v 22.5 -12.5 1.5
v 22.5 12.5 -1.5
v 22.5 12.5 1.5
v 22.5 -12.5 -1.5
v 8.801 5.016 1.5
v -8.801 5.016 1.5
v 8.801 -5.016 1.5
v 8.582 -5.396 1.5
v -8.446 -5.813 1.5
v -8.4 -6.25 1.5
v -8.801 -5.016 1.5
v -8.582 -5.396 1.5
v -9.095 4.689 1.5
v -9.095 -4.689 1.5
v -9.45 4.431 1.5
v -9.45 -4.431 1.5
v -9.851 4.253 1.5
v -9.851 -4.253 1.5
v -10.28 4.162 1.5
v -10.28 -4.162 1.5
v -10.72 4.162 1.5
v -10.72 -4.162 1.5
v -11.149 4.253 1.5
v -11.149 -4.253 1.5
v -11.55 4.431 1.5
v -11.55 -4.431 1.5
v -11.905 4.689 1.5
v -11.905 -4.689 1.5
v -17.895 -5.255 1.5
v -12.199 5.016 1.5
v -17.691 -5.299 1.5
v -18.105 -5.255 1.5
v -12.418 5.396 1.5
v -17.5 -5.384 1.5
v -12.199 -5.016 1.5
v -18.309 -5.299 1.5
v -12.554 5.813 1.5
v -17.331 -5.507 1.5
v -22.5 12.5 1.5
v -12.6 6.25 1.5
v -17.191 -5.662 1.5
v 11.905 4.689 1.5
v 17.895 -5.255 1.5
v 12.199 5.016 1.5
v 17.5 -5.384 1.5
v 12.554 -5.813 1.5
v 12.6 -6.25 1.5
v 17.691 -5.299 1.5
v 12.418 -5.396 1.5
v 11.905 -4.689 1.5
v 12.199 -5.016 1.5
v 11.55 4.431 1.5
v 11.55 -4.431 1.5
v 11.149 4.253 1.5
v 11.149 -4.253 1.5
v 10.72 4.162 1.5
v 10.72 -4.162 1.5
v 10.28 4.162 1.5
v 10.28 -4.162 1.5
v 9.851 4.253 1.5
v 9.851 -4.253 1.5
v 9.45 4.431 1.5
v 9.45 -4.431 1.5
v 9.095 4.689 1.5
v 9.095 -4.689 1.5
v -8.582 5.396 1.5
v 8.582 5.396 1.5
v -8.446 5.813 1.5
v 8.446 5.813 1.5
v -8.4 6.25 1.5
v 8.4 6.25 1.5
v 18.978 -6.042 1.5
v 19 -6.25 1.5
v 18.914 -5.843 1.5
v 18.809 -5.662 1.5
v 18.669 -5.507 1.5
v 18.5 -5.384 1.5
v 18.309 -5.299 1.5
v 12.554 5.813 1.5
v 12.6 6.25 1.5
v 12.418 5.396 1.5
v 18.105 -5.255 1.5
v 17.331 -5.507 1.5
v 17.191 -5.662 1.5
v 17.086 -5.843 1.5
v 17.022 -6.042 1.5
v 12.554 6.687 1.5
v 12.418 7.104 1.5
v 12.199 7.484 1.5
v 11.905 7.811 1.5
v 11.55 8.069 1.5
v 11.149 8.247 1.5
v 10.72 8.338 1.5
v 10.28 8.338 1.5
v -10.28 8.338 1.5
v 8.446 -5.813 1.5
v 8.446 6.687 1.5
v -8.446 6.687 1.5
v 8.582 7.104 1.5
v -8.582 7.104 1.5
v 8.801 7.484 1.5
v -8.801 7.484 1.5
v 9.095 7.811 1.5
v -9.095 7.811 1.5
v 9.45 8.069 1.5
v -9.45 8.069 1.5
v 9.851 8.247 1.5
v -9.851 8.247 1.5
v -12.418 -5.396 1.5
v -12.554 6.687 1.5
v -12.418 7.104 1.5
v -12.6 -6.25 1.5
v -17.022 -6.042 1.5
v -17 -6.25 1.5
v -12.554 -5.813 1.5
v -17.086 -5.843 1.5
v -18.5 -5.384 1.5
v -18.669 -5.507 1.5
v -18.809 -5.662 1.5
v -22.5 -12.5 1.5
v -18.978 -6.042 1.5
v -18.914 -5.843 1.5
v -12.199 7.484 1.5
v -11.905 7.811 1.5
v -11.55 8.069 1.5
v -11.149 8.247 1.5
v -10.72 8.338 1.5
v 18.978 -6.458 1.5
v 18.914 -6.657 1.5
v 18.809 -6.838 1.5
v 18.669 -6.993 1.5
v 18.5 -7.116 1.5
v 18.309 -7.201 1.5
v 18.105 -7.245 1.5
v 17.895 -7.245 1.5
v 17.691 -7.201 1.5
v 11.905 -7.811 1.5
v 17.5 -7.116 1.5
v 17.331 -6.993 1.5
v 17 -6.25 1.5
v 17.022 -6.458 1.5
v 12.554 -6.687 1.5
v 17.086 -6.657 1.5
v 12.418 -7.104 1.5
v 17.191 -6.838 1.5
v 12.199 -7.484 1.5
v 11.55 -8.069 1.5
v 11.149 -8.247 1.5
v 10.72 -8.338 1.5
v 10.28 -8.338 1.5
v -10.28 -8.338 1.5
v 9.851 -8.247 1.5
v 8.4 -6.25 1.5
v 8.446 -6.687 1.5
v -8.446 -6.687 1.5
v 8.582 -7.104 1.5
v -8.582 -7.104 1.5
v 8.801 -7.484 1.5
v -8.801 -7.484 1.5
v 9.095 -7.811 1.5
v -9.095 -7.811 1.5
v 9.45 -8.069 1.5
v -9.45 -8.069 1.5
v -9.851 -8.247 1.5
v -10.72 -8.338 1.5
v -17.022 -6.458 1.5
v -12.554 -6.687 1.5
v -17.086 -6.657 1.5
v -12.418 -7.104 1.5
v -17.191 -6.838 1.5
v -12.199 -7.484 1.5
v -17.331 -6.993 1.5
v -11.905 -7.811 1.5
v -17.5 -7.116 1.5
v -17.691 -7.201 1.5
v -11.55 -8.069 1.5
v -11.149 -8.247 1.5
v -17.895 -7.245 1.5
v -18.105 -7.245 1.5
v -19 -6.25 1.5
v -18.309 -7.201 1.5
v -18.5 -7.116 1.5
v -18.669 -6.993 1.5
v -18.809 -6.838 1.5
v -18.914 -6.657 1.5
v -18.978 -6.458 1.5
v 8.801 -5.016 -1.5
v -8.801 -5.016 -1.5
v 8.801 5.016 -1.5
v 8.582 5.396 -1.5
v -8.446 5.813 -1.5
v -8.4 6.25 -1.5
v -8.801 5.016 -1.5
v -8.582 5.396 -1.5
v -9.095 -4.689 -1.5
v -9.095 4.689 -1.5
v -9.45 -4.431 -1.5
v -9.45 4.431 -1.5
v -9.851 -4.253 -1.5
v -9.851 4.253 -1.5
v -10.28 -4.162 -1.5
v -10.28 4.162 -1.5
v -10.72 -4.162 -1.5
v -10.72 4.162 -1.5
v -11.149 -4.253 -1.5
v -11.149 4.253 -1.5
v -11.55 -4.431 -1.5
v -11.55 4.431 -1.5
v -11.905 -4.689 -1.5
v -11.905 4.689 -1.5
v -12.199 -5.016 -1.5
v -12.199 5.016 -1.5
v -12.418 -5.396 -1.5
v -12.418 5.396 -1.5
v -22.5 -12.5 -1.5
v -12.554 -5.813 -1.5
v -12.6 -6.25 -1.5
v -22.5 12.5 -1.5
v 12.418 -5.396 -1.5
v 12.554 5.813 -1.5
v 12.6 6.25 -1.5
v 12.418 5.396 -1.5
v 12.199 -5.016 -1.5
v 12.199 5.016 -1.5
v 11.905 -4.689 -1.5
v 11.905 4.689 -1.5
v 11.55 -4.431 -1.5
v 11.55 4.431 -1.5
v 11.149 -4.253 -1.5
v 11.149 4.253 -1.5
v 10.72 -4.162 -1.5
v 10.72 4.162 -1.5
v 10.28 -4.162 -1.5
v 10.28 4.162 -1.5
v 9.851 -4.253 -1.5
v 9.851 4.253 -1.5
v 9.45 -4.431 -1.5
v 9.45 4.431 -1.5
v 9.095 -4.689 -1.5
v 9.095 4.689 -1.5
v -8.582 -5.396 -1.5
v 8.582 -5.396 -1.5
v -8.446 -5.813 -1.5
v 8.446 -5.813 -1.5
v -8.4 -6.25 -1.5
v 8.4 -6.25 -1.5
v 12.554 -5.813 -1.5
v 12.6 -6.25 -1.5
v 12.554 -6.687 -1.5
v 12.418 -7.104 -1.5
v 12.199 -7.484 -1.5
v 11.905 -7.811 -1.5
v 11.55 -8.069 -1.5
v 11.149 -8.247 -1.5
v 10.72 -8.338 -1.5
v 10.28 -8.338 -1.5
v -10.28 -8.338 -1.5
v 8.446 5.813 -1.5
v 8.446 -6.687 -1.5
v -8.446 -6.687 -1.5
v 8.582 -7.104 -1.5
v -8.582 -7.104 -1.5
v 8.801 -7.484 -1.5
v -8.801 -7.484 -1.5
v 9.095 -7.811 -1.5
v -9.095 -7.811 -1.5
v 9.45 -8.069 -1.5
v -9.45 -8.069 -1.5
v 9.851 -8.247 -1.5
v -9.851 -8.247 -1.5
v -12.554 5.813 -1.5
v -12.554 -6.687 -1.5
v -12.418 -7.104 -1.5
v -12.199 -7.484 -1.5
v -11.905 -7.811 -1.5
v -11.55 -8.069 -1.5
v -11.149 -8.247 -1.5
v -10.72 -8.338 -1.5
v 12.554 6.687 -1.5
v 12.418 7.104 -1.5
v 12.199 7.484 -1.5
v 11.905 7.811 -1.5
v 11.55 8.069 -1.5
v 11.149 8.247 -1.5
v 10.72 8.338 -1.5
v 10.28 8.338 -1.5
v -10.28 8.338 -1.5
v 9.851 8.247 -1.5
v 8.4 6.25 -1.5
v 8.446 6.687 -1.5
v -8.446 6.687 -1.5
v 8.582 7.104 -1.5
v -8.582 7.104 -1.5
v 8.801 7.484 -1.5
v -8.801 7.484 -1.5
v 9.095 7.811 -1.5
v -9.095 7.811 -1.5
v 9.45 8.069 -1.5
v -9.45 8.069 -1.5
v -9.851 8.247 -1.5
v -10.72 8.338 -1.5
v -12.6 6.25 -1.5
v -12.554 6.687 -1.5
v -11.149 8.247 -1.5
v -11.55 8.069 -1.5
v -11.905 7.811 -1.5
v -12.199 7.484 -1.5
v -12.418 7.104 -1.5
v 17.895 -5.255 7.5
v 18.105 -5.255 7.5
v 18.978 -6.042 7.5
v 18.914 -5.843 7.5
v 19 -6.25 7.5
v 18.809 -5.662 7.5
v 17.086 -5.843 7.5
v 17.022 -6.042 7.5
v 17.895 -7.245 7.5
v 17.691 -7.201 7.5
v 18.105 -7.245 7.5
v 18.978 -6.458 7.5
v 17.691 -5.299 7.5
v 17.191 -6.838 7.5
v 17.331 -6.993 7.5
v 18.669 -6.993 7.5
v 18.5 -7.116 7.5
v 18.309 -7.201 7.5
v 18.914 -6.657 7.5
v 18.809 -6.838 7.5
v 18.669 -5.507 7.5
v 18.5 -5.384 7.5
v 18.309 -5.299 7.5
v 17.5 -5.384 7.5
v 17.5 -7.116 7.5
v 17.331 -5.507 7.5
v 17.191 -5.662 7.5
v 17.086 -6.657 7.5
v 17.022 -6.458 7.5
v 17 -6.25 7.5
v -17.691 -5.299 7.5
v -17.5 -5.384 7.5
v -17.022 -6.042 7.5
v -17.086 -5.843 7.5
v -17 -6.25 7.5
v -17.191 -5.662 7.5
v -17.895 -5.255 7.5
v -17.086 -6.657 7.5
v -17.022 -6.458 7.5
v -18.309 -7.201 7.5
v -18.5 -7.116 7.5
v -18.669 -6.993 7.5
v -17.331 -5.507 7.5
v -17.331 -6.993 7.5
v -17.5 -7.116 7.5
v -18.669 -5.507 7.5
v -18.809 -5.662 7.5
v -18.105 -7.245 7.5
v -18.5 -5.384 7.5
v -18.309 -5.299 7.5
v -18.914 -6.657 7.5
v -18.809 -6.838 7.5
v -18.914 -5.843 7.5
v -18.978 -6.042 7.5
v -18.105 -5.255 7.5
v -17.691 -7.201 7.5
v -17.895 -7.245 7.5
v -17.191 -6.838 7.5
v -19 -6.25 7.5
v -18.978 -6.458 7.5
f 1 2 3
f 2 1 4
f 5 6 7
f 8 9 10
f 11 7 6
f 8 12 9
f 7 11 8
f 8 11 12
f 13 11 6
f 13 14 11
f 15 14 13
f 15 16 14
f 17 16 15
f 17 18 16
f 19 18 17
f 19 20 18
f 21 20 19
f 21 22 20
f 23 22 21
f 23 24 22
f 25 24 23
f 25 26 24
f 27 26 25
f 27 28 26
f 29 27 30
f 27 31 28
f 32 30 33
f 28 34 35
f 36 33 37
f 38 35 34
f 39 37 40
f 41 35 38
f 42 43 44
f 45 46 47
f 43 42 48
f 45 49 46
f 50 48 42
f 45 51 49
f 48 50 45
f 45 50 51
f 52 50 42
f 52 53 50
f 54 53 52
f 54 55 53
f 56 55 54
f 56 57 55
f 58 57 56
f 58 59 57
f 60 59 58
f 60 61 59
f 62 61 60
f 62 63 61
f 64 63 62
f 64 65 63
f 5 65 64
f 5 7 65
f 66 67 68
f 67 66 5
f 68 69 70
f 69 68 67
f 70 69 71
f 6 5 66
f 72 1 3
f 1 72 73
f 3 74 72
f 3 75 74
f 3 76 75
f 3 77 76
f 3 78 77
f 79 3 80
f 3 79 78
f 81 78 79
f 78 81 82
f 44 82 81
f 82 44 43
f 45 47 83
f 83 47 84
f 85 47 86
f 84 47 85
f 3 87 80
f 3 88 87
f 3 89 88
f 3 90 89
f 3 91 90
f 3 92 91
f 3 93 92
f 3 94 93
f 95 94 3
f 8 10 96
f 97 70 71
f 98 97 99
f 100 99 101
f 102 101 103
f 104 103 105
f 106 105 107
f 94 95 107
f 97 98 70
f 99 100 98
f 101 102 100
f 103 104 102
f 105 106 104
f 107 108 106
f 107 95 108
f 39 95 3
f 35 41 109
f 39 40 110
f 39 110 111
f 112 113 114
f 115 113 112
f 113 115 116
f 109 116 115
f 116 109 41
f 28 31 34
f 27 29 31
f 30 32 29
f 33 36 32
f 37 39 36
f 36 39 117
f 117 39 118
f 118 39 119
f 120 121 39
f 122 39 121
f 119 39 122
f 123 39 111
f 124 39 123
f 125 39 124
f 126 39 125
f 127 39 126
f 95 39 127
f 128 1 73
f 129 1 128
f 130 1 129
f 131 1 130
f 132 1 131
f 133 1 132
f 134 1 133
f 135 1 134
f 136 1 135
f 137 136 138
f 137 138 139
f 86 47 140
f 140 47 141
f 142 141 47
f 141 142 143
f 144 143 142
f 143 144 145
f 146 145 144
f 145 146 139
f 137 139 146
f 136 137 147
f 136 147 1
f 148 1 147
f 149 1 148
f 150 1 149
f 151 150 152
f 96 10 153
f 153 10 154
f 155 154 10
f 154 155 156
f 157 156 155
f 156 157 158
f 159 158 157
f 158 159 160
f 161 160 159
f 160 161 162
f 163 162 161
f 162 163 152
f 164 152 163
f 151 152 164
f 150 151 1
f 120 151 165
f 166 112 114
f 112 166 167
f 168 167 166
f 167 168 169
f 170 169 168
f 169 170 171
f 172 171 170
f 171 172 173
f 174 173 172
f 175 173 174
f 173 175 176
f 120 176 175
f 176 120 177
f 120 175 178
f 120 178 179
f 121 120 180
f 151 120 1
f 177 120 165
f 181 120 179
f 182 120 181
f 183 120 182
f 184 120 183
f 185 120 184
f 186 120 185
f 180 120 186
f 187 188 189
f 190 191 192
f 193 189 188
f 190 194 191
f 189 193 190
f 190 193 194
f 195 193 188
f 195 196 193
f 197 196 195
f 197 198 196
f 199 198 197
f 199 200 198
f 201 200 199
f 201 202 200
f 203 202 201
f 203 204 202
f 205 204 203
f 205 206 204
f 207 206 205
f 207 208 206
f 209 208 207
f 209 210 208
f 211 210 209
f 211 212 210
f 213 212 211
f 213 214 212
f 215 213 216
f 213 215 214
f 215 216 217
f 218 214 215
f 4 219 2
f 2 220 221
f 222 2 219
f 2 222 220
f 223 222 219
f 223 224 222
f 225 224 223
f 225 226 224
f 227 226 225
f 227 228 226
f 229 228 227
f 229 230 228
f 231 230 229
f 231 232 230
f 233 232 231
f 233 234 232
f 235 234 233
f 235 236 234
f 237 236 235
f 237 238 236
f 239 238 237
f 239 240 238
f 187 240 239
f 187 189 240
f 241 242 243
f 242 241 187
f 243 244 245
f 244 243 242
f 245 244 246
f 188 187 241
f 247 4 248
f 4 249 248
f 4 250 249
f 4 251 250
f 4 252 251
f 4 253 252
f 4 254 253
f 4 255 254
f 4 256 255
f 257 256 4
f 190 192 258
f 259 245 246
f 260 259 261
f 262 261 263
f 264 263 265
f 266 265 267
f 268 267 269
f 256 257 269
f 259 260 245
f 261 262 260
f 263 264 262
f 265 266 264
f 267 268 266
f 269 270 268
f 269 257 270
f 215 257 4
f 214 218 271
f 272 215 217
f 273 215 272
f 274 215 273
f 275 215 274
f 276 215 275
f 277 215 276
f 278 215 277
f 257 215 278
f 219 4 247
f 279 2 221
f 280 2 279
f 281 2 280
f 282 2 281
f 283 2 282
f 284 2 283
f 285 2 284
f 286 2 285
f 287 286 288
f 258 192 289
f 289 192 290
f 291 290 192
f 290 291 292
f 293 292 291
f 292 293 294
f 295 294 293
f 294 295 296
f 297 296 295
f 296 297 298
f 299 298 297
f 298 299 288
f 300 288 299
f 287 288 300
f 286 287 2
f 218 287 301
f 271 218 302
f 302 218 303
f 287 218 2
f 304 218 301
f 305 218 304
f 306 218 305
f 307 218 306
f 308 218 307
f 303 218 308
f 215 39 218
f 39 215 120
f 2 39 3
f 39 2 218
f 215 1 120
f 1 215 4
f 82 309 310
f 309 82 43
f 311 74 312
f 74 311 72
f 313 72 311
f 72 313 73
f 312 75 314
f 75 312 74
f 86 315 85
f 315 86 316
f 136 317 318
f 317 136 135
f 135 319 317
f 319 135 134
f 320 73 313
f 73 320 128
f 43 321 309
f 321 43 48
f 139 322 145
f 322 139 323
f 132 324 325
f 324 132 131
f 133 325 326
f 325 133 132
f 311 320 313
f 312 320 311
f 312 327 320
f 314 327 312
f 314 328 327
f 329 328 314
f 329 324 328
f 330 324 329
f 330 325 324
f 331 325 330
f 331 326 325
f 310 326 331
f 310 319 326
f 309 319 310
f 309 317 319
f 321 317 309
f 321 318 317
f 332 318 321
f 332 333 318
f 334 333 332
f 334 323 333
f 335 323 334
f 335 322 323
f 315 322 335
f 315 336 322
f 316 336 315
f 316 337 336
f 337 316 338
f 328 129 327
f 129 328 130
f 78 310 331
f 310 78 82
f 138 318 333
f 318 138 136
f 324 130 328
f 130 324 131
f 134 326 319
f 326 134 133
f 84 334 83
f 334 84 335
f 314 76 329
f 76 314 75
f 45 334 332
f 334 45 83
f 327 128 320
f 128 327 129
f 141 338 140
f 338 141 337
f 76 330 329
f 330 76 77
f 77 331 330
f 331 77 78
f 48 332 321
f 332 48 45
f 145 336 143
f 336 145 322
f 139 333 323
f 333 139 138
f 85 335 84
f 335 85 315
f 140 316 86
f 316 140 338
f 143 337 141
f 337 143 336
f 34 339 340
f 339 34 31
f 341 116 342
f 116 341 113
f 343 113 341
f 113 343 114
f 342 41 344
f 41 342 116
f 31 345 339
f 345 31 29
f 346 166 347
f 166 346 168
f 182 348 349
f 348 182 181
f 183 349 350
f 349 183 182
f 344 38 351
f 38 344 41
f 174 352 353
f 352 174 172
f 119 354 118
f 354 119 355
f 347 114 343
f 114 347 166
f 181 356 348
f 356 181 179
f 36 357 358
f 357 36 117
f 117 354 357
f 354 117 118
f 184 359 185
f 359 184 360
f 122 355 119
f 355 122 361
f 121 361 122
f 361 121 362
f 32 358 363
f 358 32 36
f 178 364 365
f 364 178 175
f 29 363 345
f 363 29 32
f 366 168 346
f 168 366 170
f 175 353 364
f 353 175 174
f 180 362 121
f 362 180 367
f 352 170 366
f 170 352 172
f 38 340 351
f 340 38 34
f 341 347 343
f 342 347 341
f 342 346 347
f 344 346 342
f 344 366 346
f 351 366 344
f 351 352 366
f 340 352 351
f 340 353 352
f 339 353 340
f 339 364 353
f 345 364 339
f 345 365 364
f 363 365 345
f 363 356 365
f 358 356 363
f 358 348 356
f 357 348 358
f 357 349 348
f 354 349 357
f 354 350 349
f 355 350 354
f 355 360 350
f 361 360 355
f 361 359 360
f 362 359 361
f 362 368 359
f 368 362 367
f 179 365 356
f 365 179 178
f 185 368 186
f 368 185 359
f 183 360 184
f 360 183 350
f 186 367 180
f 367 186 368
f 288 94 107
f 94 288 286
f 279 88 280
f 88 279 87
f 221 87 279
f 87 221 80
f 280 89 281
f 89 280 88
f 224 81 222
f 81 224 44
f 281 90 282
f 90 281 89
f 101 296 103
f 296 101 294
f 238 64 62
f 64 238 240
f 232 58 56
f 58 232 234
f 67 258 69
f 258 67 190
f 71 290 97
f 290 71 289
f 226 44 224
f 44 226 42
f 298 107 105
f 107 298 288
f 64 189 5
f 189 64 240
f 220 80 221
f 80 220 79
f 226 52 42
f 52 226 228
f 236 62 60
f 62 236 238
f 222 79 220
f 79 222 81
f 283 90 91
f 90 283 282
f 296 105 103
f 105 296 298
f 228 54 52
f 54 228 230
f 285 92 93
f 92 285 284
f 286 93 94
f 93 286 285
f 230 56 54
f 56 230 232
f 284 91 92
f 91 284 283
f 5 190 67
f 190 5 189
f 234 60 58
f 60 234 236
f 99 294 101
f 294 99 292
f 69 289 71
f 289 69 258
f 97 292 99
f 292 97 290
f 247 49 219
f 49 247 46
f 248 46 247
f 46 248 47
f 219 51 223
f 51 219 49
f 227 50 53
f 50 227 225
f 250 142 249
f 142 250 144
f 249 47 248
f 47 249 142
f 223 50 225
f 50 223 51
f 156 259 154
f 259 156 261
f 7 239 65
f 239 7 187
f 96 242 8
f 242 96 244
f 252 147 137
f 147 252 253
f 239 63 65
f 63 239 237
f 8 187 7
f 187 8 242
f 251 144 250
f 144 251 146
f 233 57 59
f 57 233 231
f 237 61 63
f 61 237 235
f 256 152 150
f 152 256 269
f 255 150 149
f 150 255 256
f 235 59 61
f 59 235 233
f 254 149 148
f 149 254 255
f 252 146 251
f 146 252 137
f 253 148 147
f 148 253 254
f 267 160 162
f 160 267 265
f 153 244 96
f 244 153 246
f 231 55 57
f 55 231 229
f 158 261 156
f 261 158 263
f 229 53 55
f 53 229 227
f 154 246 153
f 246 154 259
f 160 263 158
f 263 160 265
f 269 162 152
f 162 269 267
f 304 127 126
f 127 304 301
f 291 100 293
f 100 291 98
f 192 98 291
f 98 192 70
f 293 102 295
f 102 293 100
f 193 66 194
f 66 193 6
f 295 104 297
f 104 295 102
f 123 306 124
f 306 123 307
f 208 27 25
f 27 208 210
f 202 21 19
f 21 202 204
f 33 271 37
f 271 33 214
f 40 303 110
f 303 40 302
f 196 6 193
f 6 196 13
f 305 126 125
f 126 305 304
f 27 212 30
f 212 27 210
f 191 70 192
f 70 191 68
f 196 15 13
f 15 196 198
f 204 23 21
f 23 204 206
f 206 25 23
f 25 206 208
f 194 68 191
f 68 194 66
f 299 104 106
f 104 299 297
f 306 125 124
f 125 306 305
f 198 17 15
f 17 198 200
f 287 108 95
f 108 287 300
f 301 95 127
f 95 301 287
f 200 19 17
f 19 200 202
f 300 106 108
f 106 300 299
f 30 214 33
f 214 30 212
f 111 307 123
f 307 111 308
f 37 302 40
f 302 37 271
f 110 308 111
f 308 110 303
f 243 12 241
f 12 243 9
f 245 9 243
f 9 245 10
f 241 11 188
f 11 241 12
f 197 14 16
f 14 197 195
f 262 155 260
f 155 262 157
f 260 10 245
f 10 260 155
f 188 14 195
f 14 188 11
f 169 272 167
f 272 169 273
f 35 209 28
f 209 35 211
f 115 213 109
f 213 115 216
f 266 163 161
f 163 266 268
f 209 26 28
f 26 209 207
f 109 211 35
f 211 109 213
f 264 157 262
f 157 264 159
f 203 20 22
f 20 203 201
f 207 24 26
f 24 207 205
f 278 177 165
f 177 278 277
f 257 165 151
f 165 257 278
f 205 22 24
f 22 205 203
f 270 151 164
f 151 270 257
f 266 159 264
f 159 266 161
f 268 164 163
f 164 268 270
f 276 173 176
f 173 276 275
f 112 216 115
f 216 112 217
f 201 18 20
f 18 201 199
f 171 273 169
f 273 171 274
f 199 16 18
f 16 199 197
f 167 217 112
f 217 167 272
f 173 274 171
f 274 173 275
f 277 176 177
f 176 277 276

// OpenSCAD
$fn=30;

difference() {
    union() {
        cube([45, 25, 3], center=true);
        
        translate([18, -6.25, 4]) {
            cylinder(7, 1, 1, center=true);
        }

        translate([-18, -6.25, 4]) {
            cylinder(7, 1, 1, center=true);
        }
    }

    union() {
        translate([10.5, 6.25, 0]) {
            cylinder(5, 2.1, 2.1, center=true);
        }
        
        translate([10.5, -6.25, 0]) {
            cylinder(5, 2.1, 2.1, center=true);
        }
            
        translate([-10.5, 6.25, 0]) {
            cylinder(5, 2.1, 2.1, center=true);
        }

        translate([-10.5, -6.25, 0]) {
            cylinder(5, 2.1, 2.1, center=true);
        }
    }
}
